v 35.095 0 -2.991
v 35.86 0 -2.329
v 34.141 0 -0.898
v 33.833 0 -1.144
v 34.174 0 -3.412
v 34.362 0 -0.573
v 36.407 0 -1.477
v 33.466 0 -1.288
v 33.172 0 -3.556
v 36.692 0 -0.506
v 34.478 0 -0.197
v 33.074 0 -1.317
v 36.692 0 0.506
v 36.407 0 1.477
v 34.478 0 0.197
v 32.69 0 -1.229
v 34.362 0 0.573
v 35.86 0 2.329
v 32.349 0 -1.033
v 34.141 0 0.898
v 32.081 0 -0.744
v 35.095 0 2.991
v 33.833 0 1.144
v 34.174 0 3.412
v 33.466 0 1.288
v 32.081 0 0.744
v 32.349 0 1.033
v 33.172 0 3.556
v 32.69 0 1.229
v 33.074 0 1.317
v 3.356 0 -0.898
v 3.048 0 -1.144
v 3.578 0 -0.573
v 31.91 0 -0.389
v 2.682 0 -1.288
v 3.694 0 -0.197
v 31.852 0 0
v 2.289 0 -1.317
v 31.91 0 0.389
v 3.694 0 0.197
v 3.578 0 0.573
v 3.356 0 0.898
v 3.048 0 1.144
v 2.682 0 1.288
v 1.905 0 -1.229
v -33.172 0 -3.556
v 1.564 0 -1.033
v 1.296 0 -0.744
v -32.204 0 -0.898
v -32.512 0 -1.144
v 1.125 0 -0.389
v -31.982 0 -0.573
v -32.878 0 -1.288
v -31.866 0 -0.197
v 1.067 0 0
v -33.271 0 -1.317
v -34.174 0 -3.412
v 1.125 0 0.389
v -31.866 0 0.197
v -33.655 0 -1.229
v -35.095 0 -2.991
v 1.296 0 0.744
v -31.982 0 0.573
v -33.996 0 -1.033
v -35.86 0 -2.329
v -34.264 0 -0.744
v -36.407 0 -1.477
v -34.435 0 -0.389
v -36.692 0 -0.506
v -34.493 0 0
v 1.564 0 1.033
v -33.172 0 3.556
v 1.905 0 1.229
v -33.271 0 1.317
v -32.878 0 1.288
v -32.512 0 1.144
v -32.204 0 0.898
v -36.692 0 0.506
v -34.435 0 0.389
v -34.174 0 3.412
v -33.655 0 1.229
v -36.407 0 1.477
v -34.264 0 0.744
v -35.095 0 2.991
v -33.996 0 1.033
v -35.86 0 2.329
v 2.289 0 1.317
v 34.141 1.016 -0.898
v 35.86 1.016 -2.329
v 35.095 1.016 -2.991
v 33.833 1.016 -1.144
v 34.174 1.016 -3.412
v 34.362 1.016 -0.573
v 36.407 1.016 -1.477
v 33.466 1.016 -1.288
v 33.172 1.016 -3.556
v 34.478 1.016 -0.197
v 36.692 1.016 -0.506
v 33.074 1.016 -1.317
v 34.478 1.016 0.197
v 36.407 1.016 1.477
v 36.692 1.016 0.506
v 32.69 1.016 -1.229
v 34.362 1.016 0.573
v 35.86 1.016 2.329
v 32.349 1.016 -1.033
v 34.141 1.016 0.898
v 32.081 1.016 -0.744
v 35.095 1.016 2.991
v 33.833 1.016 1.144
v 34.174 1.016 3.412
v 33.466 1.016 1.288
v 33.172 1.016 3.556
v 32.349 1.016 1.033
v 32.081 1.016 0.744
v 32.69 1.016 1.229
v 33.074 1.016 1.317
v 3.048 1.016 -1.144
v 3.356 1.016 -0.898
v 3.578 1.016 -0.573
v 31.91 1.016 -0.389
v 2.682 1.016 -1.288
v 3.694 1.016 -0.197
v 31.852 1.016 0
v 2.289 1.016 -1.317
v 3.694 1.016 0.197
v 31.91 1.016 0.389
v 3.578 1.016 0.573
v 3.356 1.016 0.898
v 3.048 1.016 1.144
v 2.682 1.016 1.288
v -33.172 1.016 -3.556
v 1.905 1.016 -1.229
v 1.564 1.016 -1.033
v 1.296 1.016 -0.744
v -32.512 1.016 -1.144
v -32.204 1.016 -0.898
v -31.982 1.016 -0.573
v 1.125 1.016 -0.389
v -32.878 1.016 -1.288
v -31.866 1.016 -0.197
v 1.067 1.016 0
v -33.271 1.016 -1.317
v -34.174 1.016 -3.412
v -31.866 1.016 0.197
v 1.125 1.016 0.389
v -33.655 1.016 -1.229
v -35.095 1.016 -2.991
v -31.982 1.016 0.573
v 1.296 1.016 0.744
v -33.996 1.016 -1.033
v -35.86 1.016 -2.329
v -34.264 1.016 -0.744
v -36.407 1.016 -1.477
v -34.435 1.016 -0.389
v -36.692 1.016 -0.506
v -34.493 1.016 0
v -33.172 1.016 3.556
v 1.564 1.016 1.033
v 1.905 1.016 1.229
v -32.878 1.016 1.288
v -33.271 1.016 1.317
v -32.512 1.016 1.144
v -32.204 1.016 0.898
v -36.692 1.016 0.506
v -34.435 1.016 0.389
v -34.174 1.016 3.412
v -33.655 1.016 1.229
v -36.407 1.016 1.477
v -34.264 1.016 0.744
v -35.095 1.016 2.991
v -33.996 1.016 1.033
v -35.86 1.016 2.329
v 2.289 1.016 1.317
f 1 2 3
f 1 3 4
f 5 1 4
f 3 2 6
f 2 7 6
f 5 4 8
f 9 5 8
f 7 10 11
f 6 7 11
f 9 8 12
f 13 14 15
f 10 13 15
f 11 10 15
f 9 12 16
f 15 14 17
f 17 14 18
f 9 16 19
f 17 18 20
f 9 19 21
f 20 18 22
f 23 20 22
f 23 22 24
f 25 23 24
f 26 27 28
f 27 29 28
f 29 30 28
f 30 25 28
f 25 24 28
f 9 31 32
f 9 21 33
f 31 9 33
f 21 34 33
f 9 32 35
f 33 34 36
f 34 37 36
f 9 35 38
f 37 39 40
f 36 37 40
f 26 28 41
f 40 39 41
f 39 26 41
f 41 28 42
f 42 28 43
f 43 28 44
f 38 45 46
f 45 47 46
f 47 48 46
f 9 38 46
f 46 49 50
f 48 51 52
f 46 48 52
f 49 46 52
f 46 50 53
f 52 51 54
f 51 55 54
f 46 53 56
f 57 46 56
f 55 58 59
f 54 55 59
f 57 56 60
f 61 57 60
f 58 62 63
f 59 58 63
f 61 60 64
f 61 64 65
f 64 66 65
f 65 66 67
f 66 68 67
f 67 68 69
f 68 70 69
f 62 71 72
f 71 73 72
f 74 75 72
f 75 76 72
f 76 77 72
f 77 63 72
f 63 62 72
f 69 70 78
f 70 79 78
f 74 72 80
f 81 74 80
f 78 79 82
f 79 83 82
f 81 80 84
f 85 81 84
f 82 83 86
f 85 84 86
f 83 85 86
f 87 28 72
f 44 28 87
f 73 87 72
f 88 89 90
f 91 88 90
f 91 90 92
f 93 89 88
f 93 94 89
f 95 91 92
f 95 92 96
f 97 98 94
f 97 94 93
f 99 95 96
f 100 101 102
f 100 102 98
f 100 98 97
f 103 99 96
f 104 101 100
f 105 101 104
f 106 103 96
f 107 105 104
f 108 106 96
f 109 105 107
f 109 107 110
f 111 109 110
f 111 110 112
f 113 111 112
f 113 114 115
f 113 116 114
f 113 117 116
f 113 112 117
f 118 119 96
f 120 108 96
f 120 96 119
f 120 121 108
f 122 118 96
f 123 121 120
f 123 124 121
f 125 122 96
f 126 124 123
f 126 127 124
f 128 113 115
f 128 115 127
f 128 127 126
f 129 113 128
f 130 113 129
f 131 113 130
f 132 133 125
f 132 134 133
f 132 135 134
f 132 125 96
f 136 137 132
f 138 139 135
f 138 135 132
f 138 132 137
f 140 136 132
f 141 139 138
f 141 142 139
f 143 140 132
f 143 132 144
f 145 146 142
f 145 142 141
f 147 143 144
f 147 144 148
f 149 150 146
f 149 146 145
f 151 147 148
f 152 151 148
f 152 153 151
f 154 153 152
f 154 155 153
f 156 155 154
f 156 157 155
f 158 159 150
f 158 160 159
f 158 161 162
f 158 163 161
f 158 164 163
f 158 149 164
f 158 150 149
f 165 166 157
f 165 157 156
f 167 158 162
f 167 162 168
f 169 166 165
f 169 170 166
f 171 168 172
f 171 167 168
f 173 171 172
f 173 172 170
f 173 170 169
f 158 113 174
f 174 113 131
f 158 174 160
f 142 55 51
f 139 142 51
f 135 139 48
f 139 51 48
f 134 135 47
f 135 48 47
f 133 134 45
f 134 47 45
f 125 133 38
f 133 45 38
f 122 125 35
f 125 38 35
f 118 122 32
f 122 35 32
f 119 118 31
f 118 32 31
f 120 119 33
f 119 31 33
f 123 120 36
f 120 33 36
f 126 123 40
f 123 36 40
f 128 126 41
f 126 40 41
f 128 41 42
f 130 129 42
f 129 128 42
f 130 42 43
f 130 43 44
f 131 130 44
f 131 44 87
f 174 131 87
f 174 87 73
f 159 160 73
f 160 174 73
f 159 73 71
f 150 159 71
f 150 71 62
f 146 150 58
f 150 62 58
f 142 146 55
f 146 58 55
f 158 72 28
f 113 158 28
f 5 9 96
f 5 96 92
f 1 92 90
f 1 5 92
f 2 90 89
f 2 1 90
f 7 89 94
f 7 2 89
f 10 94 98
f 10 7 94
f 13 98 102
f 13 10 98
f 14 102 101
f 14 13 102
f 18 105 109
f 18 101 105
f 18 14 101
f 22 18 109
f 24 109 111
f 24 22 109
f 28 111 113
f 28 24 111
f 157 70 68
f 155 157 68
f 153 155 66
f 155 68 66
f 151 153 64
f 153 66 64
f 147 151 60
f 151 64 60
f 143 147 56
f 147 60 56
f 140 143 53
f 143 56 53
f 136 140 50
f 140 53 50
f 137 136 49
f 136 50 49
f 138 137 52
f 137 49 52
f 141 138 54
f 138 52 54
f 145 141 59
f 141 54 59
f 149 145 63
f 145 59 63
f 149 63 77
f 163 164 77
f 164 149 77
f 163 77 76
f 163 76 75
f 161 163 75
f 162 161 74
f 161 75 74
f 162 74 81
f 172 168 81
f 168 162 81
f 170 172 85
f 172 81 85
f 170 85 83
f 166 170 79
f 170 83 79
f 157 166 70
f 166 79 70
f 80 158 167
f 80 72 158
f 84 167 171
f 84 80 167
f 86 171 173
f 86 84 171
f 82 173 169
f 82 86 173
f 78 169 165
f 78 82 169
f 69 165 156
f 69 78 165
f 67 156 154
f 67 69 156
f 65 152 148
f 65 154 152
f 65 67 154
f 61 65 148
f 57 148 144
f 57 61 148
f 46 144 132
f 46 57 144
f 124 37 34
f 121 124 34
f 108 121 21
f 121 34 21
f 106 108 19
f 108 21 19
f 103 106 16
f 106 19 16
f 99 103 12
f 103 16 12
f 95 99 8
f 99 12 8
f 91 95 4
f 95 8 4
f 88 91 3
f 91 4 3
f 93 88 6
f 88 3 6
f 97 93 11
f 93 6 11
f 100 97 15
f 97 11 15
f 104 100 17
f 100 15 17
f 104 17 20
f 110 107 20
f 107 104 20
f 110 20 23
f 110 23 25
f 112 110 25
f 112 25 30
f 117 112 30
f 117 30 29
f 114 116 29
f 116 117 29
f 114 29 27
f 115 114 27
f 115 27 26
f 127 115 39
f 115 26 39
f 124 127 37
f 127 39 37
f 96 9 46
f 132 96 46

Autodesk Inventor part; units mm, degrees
ref_plane "YZ Plane" through (0, 0, 0) normal (1, 0, 0) x (0, 1, 0)
ref_plane "XZ Plane" through (0, 0, 0) normal (0, 1, 0) x (-1, 0, 0)
ref_plane "XY Plane" through (0, 0, 0) normal (0, 0, 1) x (1, 0, 0)
sketch "Sketch1" plane through (0, 0, 0) normal (0, 1, 0) x (-1, 0, 0)
  line L0 (33.1724, 3.556) -> (-33.1724, 3.556)
  line L1 (-33.1724, -3.556) -> (33.1724, -3.556)
  line L2 (33.1724, 3.556) -> (-33.1724, -3.556) construction
  line L3 (-33.1724, 3.556) -> (33.1724, -3.556) construction
  arc A0 (33.1724, -3.556) -> (33.1724, 3.556) centre (33.1724, 0) ccw
  arc A1 (-33.1724, 3.556) -> (-33.1724, -3.556) centre (-33.1724, 0) ccw
  circle A2 centre (33.1724, 0) radius 1.3208
  circle A3 centre (-2.3876, 0) radius 1.3208
  circle A4 centre (-33.1724, 0) radius 1.3208
  point P0 (0, 0)
  dimension "d2" = 2.6416
  dimension "d3" = 2.6416
  dimension "d4" = 2.6416
  dimension "d5" = 35.56
extrude "Extrusion1" add sketch "Sketch1" along normal blind 1.016
properties part number "ArmConnector1Mini"
